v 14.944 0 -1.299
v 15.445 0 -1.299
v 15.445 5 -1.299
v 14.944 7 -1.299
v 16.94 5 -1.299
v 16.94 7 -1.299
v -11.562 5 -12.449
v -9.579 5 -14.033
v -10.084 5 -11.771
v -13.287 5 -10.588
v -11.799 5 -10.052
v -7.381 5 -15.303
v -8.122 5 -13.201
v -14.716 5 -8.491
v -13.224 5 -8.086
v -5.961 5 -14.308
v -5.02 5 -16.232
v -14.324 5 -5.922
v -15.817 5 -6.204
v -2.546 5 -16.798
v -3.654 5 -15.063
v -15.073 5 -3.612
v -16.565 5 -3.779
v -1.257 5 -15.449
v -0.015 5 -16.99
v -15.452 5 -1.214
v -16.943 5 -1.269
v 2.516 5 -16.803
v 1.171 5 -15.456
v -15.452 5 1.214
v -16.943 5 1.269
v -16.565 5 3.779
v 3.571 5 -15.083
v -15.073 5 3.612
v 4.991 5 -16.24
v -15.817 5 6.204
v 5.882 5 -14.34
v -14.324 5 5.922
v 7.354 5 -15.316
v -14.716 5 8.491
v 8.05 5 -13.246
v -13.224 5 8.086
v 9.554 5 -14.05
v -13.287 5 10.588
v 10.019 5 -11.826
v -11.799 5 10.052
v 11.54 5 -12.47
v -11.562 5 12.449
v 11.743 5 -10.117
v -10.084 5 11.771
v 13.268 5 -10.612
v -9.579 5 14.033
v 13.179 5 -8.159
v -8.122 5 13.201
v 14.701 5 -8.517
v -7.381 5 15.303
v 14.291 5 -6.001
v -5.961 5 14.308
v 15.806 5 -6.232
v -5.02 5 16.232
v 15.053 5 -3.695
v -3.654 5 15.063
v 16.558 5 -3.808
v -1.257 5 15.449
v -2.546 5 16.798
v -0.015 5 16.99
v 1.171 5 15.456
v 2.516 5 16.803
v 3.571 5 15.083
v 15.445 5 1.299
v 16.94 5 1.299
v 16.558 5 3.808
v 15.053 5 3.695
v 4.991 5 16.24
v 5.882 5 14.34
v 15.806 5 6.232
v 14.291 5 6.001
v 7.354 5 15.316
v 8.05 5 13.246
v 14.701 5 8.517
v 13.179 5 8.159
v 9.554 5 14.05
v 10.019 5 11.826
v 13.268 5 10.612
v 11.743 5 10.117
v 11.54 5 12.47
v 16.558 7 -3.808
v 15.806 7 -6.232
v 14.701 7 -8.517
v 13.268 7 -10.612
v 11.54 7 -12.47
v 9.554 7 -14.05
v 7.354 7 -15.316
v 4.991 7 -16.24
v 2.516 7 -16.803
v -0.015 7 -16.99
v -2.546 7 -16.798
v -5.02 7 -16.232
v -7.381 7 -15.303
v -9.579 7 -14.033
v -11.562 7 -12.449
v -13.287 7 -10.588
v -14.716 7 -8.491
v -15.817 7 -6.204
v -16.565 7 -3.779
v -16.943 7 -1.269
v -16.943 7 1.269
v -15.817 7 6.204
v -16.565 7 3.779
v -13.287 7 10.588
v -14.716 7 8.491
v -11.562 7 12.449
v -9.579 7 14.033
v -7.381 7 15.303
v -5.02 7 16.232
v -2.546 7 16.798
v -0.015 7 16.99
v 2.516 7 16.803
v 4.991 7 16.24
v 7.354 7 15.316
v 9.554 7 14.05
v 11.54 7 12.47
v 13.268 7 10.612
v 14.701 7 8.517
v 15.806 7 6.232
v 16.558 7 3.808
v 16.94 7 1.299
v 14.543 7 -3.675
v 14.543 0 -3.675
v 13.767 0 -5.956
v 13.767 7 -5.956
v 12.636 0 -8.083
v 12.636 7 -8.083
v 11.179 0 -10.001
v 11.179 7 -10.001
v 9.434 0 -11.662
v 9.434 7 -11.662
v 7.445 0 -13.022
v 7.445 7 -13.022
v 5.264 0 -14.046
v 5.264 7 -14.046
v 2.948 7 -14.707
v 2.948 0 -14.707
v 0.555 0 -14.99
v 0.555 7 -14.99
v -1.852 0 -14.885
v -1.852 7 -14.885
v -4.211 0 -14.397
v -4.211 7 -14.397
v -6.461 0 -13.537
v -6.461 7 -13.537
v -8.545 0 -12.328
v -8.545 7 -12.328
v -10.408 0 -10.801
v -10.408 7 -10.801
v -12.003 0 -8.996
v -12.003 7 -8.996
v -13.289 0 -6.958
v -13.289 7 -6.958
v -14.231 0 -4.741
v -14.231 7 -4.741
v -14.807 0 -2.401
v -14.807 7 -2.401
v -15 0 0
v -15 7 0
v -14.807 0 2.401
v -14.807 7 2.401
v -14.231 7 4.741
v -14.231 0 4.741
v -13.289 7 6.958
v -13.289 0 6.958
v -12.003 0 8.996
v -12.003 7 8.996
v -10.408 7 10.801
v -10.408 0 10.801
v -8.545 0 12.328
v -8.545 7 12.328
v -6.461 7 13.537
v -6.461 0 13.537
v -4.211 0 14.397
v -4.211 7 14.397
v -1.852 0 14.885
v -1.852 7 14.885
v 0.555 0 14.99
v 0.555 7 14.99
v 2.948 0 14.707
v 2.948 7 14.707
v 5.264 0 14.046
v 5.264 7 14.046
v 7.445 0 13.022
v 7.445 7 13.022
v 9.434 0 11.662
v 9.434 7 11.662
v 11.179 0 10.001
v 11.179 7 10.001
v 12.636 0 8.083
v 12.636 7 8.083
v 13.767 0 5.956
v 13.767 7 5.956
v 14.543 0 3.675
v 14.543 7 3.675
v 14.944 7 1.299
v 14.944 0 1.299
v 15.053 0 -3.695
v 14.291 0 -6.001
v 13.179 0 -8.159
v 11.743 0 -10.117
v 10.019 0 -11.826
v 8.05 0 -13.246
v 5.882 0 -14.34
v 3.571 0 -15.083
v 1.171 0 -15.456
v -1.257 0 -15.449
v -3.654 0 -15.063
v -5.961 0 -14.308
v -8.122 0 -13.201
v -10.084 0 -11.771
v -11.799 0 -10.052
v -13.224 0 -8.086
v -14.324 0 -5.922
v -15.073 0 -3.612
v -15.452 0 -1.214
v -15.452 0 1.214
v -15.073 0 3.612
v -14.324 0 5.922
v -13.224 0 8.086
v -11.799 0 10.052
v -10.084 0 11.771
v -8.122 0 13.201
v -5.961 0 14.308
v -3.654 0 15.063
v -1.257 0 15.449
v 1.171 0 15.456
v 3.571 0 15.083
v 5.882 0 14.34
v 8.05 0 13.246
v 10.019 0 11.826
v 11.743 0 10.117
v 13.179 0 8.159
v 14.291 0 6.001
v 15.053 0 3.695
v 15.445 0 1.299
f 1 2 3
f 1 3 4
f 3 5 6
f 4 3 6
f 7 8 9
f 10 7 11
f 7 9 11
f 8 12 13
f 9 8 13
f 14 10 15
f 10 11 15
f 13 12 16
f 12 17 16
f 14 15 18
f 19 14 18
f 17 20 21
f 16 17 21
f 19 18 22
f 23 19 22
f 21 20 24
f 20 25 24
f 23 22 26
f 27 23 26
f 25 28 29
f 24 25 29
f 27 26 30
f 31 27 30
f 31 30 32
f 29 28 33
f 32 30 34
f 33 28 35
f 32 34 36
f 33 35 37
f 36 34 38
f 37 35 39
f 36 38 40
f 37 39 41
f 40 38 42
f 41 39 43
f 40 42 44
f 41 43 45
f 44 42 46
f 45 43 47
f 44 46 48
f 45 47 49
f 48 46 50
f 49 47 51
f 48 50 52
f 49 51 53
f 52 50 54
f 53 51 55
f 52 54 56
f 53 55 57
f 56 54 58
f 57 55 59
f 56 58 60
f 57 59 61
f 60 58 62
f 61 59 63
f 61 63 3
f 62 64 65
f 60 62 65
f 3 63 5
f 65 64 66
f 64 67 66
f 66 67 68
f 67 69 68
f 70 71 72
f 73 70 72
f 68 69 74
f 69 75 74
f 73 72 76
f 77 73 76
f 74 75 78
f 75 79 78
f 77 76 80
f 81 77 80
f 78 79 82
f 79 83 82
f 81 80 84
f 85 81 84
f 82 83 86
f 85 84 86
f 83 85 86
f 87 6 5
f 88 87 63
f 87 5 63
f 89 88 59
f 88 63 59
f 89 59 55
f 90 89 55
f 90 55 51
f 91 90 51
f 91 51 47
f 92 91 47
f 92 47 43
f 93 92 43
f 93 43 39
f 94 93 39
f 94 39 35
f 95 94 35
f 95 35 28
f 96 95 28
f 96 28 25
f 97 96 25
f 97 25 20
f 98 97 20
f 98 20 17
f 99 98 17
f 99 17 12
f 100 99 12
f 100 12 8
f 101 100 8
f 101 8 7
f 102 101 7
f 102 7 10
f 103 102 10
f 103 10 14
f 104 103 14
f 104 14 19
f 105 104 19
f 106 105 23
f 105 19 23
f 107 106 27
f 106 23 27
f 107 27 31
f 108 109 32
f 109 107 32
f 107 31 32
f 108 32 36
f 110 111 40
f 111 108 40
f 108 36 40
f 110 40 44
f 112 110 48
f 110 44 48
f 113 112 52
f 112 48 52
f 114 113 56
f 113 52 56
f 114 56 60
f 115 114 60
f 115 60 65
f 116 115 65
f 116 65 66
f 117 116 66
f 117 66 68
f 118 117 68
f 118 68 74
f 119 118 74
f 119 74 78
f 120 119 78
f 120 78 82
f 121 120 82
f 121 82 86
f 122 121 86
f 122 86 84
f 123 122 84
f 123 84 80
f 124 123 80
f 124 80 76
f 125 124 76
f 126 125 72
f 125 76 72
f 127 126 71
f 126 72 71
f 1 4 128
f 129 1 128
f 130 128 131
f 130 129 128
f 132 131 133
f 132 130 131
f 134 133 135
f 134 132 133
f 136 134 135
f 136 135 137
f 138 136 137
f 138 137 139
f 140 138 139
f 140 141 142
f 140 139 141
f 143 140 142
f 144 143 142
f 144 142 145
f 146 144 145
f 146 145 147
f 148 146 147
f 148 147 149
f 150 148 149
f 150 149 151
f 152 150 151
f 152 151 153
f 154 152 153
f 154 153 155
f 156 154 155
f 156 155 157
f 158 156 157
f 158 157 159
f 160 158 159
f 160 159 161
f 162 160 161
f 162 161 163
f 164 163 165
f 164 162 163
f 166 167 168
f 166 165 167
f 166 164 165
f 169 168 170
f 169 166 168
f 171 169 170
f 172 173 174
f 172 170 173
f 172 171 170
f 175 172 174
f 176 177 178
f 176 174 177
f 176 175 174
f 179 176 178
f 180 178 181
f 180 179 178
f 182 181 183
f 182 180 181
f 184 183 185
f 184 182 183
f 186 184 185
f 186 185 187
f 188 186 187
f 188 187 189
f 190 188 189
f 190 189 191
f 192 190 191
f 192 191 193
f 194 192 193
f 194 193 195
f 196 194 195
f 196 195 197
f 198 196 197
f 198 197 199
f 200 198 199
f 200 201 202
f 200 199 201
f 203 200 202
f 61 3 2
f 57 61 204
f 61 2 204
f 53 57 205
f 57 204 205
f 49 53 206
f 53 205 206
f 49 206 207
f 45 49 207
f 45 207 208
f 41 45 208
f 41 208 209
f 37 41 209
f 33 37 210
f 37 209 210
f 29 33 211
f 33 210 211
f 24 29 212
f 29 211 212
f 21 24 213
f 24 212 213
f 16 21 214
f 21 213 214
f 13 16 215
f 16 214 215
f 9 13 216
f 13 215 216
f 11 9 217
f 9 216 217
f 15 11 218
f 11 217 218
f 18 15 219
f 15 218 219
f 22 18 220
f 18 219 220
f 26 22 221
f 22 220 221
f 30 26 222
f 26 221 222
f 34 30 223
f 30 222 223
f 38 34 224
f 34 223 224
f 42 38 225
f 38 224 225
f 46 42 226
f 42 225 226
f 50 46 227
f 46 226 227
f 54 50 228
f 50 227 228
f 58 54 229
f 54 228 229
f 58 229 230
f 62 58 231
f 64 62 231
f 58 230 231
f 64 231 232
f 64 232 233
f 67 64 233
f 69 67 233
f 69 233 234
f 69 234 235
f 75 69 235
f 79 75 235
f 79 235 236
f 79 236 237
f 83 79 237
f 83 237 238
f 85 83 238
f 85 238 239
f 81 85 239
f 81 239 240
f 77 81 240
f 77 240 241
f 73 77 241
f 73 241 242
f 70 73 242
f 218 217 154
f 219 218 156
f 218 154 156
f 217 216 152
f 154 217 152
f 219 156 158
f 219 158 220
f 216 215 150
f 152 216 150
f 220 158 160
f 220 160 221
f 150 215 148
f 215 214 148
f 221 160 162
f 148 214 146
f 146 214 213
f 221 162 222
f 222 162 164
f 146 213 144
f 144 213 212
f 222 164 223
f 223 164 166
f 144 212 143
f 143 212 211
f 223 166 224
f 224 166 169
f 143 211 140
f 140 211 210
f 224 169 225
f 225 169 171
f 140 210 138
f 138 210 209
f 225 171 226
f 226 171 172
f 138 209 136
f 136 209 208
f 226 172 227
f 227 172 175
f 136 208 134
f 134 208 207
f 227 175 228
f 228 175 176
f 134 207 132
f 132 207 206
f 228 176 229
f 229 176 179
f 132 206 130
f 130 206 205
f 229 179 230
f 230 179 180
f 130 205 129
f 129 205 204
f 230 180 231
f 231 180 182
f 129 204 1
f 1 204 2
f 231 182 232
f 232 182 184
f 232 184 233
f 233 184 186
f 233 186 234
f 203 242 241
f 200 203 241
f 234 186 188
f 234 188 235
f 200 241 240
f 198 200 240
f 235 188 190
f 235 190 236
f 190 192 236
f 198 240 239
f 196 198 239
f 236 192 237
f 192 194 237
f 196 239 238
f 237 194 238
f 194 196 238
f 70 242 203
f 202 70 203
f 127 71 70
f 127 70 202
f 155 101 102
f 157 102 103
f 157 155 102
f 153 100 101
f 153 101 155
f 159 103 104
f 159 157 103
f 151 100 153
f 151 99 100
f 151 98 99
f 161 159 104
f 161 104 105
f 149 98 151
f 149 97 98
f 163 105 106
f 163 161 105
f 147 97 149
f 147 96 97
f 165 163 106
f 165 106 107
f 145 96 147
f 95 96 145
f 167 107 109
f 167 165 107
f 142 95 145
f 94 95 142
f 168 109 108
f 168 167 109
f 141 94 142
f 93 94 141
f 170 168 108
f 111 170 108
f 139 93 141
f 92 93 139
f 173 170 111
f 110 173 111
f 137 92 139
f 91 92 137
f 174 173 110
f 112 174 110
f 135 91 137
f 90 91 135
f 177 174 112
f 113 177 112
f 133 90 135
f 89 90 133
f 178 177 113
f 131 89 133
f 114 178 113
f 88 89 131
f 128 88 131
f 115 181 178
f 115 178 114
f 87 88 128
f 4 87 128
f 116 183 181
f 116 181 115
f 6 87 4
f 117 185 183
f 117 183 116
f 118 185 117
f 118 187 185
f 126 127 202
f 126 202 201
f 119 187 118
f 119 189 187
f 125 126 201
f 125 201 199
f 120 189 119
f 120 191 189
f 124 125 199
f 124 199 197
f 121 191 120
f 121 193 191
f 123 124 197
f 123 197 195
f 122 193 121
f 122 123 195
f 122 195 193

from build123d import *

# Parameters (mm, degrees)
SKETCH1_R           = 15.5
SKETCH1_R_2         = 15
BOSS_EXTRUDE1_DEPTH = 7
BOSS_EXTRUDE2_START = -2
SKETCH2_R           = 16.99
SKETCH2_R_2         = 15.5
BOSS_EXTRUDE2_DEPTH = 2
SKETCH3_W           = 2.598251864
SKETCH3_H           = 7
CUT_EXTRUDE1_DEPTH  = 10


with BuildPart() as part:
    # Sketch1 → Boss-Extrude1 (new body)
    with BuildSketch(Plane(origin=(0, 0, 0), x_dir=(1, 0, 0), z_dir=(0, 1, 0))):
        with Locations(Location((0, 0, 0), (0, 0, 270))):
            Circle(SKETCH1_R)
        with Locations(Location((0, 0, 0), (0, 0, 270))):
            Circle(SKETCH1_R_2, mode=Mode.SUBTRACT)
    extrude(amount=BOSS_EXTRUDE1_DEPTH)

    # Sketch2 → Boss-Extrude2 (add)
    with BuildSketch(Plane(origin=(0, 7, 0), x_dir=(1, 0, 0), z_dir=(0, 1, 0)).offset(BOSS_EXTRUDE2_START)):
        with Locations(Location((0, 0, 0), (0, 0, 270))):
            Circle(SKETCH2_R)
        with Locations(Location((0, 0, 0), (0, 0, 270))):
            Circle(SKETCH2_R_2, mode=Mode.SUBTRACT)
    extrude(amount=BOSS_EXTRUDE2_DEPTH)

    # Sketch3 → Cut-Extrude1 (cut)
    with BuildSketch(Plane(origin=(16.99, 0, 0), x_dir=(0, 0, -1), z_dir=(1, 0, 0))):
        with Locations((0, 3.5)):
            Rectangle(SKETCH3_W, SKETCH3_H)
    extrude(amount=-CUT_EXTRUDE1_DEPTH, mode=Mode.SUBTRACT)


solid = part.part
